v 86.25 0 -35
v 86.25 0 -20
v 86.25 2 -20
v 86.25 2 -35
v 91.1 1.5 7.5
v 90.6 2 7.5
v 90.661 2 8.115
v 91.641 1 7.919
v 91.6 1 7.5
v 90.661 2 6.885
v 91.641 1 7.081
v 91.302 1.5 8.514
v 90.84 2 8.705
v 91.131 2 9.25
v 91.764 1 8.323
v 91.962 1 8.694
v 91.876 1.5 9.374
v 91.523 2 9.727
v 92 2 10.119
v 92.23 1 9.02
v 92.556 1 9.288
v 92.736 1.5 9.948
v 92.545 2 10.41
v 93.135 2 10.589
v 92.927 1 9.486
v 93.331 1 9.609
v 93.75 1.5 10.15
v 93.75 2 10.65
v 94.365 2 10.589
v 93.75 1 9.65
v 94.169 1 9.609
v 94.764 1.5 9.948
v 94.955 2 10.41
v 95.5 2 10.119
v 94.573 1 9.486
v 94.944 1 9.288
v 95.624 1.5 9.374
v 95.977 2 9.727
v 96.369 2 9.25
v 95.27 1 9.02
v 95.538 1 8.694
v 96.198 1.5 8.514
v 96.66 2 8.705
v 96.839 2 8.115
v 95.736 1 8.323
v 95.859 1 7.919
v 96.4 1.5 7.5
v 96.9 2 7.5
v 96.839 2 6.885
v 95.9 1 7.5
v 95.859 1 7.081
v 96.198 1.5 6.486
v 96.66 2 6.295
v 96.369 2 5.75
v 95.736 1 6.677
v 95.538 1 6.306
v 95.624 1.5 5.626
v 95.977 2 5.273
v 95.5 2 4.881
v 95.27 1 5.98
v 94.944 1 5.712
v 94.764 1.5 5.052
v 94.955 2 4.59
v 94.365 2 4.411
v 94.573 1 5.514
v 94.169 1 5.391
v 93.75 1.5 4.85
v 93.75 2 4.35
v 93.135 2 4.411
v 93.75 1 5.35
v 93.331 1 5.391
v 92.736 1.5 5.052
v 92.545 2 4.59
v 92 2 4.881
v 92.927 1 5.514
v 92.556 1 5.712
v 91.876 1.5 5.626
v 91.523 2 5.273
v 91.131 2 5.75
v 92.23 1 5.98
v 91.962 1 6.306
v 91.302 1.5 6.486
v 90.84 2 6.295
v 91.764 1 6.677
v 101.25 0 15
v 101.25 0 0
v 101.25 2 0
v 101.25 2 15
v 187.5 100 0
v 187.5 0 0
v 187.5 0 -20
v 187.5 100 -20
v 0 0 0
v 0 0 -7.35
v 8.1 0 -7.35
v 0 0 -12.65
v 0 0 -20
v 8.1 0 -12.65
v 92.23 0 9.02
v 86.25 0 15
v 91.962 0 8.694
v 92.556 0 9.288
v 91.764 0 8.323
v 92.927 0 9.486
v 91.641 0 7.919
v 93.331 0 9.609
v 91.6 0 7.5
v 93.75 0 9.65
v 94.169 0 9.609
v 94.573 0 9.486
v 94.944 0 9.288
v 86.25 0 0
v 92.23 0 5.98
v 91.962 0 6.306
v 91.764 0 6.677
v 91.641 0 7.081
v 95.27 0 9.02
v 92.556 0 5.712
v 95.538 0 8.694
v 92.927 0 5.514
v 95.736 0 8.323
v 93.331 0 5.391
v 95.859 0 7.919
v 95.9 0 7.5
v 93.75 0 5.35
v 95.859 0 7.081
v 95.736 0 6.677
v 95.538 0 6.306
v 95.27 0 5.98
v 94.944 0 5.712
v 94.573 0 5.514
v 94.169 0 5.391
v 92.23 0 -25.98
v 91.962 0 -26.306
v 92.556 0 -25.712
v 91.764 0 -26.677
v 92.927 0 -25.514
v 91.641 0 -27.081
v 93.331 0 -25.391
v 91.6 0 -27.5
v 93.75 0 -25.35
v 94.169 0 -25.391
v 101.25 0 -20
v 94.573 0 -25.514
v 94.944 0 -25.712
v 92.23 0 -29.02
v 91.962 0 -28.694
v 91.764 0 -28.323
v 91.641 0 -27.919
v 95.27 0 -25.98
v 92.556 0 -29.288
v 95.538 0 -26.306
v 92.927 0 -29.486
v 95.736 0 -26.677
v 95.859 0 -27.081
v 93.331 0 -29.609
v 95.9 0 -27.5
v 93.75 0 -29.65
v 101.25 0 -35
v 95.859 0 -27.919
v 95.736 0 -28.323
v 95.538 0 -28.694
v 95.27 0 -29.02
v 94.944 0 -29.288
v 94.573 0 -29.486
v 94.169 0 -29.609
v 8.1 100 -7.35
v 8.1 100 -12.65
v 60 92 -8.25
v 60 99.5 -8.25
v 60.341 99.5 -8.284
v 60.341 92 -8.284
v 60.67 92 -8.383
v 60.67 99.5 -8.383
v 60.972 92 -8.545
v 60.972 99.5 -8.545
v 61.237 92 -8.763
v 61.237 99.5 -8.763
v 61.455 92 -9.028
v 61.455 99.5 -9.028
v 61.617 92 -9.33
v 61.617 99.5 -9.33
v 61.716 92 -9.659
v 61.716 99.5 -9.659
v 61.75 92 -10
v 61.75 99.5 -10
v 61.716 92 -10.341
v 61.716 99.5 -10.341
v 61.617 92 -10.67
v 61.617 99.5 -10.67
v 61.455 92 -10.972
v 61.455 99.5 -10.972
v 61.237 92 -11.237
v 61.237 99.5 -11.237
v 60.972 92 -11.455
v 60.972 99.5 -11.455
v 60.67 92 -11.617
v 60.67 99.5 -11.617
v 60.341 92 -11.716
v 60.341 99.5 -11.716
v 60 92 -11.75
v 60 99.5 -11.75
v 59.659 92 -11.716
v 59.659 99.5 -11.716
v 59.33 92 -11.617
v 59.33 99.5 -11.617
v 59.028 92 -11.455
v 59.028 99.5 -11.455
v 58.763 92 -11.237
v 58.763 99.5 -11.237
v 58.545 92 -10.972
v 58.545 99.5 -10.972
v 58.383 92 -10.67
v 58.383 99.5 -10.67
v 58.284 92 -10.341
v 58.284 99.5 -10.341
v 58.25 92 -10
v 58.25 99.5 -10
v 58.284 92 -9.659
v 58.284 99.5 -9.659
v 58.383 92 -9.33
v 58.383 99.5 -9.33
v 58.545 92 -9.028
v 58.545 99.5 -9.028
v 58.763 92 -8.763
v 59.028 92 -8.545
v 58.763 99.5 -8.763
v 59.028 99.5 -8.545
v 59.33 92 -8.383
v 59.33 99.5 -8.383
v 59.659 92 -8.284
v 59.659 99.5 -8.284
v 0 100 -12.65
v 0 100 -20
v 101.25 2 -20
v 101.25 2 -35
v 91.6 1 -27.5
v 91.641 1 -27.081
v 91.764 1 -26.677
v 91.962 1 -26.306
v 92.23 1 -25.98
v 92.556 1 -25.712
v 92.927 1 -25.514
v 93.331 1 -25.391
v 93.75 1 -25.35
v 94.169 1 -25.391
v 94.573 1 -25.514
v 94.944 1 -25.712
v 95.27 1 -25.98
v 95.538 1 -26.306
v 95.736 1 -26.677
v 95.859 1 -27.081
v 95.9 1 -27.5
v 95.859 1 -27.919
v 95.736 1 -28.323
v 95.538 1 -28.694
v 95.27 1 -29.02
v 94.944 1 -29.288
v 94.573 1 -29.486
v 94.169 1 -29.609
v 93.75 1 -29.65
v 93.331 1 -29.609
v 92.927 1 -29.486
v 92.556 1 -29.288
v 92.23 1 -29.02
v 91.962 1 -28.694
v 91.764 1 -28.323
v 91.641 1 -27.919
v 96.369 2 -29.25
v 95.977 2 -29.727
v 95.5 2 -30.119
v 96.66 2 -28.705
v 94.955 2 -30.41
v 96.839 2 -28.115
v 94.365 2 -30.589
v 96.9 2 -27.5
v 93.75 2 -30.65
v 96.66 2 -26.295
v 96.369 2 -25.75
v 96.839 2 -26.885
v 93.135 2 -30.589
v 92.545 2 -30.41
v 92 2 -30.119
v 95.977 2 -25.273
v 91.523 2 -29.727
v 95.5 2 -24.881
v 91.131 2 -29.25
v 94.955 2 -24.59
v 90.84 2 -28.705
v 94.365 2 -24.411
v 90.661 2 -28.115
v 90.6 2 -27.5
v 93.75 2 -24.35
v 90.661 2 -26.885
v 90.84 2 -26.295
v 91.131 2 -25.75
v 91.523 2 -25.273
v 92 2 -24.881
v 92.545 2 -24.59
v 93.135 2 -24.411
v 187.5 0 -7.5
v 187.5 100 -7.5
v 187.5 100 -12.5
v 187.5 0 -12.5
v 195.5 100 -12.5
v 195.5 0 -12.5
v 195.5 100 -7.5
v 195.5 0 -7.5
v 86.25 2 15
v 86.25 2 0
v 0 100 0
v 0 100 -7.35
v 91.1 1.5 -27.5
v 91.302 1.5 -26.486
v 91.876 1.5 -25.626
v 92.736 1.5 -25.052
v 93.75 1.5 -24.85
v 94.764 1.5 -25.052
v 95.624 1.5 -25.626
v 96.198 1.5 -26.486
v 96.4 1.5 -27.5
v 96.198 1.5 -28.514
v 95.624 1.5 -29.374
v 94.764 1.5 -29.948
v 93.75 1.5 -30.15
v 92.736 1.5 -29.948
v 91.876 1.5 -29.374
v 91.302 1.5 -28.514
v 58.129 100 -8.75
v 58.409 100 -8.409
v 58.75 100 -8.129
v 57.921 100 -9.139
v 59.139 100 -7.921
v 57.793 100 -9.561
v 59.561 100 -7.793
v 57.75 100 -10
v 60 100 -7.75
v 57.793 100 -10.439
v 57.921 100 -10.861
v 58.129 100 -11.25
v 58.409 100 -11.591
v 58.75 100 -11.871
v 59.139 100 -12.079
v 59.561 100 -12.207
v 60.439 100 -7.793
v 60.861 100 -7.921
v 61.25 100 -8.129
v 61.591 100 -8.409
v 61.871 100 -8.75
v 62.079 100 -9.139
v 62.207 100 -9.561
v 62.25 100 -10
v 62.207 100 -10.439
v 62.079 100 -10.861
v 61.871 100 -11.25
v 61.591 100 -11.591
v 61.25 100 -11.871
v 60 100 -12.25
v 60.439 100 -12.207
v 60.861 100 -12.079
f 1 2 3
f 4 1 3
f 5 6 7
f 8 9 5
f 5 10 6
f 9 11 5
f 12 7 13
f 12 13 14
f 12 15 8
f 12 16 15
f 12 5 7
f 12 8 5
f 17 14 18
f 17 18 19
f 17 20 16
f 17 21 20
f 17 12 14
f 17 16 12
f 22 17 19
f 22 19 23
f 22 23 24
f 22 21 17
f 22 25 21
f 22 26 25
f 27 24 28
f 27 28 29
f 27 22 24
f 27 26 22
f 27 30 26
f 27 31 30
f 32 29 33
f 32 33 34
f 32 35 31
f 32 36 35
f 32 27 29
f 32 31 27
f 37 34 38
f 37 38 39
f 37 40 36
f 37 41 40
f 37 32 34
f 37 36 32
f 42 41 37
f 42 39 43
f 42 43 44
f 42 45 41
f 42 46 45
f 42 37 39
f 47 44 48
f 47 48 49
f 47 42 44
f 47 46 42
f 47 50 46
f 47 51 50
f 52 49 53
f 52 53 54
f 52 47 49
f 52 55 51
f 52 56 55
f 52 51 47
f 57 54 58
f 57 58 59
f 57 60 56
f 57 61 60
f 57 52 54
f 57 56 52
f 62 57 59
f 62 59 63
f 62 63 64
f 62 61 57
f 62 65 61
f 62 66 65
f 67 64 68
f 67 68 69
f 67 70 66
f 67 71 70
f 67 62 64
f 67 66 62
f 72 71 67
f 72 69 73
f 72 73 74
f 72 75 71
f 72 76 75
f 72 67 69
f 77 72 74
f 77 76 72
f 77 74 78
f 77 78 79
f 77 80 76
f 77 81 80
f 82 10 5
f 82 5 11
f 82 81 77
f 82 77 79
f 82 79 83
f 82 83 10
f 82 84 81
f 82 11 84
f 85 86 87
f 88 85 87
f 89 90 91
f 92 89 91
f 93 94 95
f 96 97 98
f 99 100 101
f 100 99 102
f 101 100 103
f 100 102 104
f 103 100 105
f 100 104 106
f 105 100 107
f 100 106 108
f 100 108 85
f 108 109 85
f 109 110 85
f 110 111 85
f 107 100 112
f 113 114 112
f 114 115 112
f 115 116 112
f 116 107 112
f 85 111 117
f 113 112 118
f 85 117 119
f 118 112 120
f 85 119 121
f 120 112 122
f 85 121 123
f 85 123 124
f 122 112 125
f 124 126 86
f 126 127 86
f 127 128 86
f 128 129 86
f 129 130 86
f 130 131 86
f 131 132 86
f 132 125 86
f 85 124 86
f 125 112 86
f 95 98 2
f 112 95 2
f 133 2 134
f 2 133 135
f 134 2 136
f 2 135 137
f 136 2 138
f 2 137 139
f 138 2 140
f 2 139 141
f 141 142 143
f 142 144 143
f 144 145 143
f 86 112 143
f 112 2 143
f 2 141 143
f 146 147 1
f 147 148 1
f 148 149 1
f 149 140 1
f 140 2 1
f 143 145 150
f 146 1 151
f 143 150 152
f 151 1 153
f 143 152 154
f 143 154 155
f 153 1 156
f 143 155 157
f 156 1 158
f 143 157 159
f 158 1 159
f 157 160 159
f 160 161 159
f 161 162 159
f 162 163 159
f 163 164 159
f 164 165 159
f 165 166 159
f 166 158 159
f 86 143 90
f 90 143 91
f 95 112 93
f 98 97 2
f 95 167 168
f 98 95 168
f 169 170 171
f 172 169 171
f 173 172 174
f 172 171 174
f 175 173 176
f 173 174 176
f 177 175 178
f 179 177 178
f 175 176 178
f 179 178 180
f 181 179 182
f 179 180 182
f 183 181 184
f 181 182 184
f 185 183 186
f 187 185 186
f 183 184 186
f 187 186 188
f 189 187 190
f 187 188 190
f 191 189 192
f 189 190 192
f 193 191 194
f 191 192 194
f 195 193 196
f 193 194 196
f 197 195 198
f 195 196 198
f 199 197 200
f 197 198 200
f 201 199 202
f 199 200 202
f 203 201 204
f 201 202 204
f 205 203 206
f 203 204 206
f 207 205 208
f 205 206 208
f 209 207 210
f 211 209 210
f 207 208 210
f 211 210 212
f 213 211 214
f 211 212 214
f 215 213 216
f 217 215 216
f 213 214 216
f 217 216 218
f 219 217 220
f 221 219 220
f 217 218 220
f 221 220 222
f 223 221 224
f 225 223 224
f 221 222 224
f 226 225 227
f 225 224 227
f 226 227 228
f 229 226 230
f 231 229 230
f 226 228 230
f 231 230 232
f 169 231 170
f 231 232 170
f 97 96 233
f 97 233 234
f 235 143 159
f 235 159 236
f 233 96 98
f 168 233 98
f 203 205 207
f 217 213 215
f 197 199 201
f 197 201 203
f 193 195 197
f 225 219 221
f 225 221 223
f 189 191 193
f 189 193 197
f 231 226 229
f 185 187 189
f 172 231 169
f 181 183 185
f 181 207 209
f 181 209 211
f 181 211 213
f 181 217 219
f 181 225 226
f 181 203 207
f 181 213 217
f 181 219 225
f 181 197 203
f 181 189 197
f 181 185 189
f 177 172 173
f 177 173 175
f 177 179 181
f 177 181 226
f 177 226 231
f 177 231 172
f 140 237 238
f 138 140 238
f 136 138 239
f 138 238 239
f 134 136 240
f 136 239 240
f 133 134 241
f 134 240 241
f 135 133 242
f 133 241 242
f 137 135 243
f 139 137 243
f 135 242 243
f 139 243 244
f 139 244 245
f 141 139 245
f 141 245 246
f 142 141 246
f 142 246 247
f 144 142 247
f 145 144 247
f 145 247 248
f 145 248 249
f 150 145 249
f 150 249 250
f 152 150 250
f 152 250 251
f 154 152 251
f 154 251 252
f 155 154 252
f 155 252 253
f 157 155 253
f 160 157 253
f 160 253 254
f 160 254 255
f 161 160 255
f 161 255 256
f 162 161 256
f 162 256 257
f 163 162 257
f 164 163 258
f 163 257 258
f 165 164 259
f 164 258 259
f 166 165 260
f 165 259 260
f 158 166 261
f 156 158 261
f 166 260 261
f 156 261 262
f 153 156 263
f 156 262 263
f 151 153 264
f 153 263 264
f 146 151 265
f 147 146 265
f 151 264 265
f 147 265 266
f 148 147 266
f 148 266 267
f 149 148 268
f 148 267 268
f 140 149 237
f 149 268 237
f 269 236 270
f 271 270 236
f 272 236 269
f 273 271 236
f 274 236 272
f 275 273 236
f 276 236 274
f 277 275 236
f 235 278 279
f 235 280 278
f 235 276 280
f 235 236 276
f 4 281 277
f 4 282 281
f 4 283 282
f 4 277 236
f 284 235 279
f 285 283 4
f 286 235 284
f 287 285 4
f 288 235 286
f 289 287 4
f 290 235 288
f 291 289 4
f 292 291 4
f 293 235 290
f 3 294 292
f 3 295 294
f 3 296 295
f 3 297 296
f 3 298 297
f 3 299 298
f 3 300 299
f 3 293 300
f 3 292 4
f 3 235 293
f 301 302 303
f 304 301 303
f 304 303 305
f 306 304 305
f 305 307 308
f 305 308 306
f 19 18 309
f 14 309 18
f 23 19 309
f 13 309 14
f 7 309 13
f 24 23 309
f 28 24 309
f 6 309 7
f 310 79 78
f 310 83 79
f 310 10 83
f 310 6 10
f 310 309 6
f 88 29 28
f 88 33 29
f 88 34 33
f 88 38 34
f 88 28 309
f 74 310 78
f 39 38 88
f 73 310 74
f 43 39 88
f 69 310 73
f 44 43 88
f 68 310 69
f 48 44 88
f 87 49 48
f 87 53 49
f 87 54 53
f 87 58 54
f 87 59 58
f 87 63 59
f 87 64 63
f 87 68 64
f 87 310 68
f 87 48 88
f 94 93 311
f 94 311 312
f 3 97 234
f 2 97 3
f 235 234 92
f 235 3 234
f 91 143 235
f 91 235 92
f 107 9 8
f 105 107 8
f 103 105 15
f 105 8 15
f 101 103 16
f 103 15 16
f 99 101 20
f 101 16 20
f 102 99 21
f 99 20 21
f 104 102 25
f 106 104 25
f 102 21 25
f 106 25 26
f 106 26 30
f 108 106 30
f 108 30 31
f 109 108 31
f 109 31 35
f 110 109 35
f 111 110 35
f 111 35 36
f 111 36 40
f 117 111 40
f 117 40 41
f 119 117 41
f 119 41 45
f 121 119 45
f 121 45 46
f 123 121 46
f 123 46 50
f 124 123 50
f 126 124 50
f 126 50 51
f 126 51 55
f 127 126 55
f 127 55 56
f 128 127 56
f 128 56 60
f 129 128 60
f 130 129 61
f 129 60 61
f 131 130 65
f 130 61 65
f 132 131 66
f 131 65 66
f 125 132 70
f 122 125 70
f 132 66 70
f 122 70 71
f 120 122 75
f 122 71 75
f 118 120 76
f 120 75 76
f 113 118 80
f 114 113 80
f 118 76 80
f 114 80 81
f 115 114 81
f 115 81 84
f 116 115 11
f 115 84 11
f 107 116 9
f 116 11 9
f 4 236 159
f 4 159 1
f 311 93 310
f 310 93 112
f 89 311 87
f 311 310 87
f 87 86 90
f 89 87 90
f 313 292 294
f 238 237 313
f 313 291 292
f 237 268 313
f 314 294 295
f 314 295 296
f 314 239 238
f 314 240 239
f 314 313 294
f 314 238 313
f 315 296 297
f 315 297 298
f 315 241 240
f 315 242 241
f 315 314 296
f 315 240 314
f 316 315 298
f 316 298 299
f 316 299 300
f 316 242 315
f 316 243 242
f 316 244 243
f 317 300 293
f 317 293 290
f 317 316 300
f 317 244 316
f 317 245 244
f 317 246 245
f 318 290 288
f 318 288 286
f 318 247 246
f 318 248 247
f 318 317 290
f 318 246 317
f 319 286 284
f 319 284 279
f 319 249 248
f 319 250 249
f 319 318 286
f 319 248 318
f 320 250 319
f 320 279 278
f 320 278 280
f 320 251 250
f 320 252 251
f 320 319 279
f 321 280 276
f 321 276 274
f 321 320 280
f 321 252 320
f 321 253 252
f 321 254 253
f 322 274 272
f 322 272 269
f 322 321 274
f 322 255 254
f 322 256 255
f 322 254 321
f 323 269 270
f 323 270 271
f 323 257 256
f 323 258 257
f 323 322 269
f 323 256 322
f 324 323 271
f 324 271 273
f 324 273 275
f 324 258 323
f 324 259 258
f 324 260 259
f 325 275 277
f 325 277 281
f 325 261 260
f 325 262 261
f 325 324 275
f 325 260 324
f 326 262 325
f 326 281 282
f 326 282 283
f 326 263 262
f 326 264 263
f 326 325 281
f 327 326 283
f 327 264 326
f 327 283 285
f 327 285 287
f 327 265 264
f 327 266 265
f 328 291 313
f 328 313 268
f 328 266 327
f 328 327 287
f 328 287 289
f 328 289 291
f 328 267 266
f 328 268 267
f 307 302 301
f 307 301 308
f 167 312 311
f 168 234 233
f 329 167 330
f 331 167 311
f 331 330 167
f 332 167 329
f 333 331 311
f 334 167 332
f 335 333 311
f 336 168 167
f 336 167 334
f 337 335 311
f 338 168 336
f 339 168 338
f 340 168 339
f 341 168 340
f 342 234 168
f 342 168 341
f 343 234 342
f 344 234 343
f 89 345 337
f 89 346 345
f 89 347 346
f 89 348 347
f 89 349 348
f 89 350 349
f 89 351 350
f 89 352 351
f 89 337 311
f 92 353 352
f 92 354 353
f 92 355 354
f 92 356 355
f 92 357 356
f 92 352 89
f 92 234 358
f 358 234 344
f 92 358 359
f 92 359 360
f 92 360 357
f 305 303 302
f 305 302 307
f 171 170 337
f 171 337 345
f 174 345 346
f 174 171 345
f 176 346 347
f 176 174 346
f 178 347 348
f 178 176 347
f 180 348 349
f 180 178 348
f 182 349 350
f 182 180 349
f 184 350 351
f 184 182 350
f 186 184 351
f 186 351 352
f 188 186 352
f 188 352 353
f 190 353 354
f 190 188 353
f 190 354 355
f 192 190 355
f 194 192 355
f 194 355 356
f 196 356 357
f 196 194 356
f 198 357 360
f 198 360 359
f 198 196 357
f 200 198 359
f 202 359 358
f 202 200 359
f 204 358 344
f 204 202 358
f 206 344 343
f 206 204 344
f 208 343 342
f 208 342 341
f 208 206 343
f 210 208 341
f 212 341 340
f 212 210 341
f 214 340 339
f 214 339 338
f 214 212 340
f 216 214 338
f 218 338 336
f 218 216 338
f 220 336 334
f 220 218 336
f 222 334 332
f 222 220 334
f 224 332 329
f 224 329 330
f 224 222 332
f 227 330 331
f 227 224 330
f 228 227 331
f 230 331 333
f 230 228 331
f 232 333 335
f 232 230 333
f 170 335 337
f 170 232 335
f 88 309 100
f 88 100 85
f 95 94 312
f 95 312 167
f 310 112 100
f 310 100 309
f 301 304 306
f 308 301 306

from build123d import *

# Parameters (mm, degrees)
SKETCH1_W           = 187.5
SKETCH1_H           = 20
BOSS_EXTRUDE1_DEPTH = 100
SKETCH2_W           = 8.1
SKETCH2_H           = 5.3
CUT_EXTRUDE1_DEPTH  = 100
SKETCH4_W           = 8
SKETCH4_H           = 5
BOSS_EXTRUDE2_DEPTH = 100
SKETCH5_R           = 1.75
CUT_EXTRUDE2_DEPTH  = 8
CHAMFER2_SIZE       = 0.5
SKETCH6_W           = 15
SKETCH6_H           = 2
BOSS_EXTRUDE3_DEPTH = 15
SKETCH7_W           = 15
SKETCH7_H           = 2
BOSS_EXTRUDE4_DEPTH = 15
SKETCH8_R           = 2.15
CUT_EXTRUDE3_DEPTH  = 15
CHAMFER3_SIZE       = 1


with BuildPart() as part:
    # Sketch1 → Boss-Extrude1 (new body)
    with BuildSketch(Plane(origin=(0, 0, 0), x_dir=(1, 0, 0), z_dir=(0, 1, 0))):
        with Locations((93.75, 10)):
            Rectangle(SKETCH1_W, SKETCH1_H)
    extrude(amount=BOSS_EXTRUDE1_DEPTH)

    # Sketch2 → Cut-Extrude1 (cut)
    with BuildSketch(Plane(origin=(0, 100, 0), x_dir=(1, 0, 0), z_dir=(0, 1, 0))):
        with Locations((4.05, 10)):
            Rectangle(SKETCH2_W, SKETCH2_H)
    extrude(amount=-CUT_EXTRUDE1_DEPTH, mode=Mode.SUBTRACT)

    # Sketch5 → Cut-Extrude2 (cut)
    with BuildSketch(Plane(origin=(0, 100, 0), x_dir=(1, 0, 0), z_dir=(0, 1, 0))):
        with Locations(Location((60, 10, 0), (0, 0, 270))):
            Circle(SKETCH5_R)
    extrude(amount=-CUT_EXTRUDE2_DEPTH, mode=Mode.SUBTRACT)

    # Chamfer2
    chamfer2_edges = [part.edges().sort_by_distance(p)[0] for p in [
        (60, 100, -11.75),
    ]]
    chamfer(chamfer2_edges, length=CHAMFER2_SIZE)

    # Sketch6 → Boss-Extrude3 (add)
    with BuildSketch(Plane(origin=(0, 0, -20), x_dir=(-1, 0, 0), z_dir=(0, 0, -1))):
        with Locations((-93.75, 1)):
            Rectangle(SKETCH6_W, SKETCH6_H)
    extrude(amount=BOSS_EXTRUDE3_DEPTH)

    # Sketch7 → Boss-Extrude4 (add)
    with BuildSketch(Plane.XY):
        with Locations((93.75, 1)):
            Rectangle(SKETCH7_W, SKETCH7_H)
    extrude(amount=BOSS_EXTRUDE4_DEPTH)

    # Sketch8 → Cut-Extrude3 (cut)
    with BuildSketch(Plane(origin=(0, 2, 0), x_dir=(1, 0, 0), z_dir=(0, 1, 0))):
        with Locations(Location((93.75, 27.5, 0), (0, 0, 180))):
            Circle(SKETCH8_R)
        with Locations(Location((93.75, -7.5, 0), (0, 0, 180))):
            Circle(SKETCH8_R)
    extrude(amount=-CUT_EXTRUDE3_DEPTH, mode=Mode.SUBTRACT)

    # Chamfer3
    chamfer3_edges = [part.edges().sort_by_distance(p)[0] for p in [
        (95.9, 2, -27.5),
        (95.9, 2, 7.5),
    ]]
    chamfer(chamfer3_edges, length=CHAMFER3_SIZE)


with BuildPart() as body_2:
    # Sketch4 → Boss-Extrude2 (new body)
    with BuildSketch(Plane(origin=(0, 100, 0), x_dir=(1, 0, 0), z_dir=(0, 1, 0))):
        with Locations((191.5, 10)):
            Rectangle(SKETCH4_W, SKETCH4_H)
    extrude(amount=-BOSS_EXTRUDE2_DEPTH)


solid = Compound([part.part, body_2.part])
